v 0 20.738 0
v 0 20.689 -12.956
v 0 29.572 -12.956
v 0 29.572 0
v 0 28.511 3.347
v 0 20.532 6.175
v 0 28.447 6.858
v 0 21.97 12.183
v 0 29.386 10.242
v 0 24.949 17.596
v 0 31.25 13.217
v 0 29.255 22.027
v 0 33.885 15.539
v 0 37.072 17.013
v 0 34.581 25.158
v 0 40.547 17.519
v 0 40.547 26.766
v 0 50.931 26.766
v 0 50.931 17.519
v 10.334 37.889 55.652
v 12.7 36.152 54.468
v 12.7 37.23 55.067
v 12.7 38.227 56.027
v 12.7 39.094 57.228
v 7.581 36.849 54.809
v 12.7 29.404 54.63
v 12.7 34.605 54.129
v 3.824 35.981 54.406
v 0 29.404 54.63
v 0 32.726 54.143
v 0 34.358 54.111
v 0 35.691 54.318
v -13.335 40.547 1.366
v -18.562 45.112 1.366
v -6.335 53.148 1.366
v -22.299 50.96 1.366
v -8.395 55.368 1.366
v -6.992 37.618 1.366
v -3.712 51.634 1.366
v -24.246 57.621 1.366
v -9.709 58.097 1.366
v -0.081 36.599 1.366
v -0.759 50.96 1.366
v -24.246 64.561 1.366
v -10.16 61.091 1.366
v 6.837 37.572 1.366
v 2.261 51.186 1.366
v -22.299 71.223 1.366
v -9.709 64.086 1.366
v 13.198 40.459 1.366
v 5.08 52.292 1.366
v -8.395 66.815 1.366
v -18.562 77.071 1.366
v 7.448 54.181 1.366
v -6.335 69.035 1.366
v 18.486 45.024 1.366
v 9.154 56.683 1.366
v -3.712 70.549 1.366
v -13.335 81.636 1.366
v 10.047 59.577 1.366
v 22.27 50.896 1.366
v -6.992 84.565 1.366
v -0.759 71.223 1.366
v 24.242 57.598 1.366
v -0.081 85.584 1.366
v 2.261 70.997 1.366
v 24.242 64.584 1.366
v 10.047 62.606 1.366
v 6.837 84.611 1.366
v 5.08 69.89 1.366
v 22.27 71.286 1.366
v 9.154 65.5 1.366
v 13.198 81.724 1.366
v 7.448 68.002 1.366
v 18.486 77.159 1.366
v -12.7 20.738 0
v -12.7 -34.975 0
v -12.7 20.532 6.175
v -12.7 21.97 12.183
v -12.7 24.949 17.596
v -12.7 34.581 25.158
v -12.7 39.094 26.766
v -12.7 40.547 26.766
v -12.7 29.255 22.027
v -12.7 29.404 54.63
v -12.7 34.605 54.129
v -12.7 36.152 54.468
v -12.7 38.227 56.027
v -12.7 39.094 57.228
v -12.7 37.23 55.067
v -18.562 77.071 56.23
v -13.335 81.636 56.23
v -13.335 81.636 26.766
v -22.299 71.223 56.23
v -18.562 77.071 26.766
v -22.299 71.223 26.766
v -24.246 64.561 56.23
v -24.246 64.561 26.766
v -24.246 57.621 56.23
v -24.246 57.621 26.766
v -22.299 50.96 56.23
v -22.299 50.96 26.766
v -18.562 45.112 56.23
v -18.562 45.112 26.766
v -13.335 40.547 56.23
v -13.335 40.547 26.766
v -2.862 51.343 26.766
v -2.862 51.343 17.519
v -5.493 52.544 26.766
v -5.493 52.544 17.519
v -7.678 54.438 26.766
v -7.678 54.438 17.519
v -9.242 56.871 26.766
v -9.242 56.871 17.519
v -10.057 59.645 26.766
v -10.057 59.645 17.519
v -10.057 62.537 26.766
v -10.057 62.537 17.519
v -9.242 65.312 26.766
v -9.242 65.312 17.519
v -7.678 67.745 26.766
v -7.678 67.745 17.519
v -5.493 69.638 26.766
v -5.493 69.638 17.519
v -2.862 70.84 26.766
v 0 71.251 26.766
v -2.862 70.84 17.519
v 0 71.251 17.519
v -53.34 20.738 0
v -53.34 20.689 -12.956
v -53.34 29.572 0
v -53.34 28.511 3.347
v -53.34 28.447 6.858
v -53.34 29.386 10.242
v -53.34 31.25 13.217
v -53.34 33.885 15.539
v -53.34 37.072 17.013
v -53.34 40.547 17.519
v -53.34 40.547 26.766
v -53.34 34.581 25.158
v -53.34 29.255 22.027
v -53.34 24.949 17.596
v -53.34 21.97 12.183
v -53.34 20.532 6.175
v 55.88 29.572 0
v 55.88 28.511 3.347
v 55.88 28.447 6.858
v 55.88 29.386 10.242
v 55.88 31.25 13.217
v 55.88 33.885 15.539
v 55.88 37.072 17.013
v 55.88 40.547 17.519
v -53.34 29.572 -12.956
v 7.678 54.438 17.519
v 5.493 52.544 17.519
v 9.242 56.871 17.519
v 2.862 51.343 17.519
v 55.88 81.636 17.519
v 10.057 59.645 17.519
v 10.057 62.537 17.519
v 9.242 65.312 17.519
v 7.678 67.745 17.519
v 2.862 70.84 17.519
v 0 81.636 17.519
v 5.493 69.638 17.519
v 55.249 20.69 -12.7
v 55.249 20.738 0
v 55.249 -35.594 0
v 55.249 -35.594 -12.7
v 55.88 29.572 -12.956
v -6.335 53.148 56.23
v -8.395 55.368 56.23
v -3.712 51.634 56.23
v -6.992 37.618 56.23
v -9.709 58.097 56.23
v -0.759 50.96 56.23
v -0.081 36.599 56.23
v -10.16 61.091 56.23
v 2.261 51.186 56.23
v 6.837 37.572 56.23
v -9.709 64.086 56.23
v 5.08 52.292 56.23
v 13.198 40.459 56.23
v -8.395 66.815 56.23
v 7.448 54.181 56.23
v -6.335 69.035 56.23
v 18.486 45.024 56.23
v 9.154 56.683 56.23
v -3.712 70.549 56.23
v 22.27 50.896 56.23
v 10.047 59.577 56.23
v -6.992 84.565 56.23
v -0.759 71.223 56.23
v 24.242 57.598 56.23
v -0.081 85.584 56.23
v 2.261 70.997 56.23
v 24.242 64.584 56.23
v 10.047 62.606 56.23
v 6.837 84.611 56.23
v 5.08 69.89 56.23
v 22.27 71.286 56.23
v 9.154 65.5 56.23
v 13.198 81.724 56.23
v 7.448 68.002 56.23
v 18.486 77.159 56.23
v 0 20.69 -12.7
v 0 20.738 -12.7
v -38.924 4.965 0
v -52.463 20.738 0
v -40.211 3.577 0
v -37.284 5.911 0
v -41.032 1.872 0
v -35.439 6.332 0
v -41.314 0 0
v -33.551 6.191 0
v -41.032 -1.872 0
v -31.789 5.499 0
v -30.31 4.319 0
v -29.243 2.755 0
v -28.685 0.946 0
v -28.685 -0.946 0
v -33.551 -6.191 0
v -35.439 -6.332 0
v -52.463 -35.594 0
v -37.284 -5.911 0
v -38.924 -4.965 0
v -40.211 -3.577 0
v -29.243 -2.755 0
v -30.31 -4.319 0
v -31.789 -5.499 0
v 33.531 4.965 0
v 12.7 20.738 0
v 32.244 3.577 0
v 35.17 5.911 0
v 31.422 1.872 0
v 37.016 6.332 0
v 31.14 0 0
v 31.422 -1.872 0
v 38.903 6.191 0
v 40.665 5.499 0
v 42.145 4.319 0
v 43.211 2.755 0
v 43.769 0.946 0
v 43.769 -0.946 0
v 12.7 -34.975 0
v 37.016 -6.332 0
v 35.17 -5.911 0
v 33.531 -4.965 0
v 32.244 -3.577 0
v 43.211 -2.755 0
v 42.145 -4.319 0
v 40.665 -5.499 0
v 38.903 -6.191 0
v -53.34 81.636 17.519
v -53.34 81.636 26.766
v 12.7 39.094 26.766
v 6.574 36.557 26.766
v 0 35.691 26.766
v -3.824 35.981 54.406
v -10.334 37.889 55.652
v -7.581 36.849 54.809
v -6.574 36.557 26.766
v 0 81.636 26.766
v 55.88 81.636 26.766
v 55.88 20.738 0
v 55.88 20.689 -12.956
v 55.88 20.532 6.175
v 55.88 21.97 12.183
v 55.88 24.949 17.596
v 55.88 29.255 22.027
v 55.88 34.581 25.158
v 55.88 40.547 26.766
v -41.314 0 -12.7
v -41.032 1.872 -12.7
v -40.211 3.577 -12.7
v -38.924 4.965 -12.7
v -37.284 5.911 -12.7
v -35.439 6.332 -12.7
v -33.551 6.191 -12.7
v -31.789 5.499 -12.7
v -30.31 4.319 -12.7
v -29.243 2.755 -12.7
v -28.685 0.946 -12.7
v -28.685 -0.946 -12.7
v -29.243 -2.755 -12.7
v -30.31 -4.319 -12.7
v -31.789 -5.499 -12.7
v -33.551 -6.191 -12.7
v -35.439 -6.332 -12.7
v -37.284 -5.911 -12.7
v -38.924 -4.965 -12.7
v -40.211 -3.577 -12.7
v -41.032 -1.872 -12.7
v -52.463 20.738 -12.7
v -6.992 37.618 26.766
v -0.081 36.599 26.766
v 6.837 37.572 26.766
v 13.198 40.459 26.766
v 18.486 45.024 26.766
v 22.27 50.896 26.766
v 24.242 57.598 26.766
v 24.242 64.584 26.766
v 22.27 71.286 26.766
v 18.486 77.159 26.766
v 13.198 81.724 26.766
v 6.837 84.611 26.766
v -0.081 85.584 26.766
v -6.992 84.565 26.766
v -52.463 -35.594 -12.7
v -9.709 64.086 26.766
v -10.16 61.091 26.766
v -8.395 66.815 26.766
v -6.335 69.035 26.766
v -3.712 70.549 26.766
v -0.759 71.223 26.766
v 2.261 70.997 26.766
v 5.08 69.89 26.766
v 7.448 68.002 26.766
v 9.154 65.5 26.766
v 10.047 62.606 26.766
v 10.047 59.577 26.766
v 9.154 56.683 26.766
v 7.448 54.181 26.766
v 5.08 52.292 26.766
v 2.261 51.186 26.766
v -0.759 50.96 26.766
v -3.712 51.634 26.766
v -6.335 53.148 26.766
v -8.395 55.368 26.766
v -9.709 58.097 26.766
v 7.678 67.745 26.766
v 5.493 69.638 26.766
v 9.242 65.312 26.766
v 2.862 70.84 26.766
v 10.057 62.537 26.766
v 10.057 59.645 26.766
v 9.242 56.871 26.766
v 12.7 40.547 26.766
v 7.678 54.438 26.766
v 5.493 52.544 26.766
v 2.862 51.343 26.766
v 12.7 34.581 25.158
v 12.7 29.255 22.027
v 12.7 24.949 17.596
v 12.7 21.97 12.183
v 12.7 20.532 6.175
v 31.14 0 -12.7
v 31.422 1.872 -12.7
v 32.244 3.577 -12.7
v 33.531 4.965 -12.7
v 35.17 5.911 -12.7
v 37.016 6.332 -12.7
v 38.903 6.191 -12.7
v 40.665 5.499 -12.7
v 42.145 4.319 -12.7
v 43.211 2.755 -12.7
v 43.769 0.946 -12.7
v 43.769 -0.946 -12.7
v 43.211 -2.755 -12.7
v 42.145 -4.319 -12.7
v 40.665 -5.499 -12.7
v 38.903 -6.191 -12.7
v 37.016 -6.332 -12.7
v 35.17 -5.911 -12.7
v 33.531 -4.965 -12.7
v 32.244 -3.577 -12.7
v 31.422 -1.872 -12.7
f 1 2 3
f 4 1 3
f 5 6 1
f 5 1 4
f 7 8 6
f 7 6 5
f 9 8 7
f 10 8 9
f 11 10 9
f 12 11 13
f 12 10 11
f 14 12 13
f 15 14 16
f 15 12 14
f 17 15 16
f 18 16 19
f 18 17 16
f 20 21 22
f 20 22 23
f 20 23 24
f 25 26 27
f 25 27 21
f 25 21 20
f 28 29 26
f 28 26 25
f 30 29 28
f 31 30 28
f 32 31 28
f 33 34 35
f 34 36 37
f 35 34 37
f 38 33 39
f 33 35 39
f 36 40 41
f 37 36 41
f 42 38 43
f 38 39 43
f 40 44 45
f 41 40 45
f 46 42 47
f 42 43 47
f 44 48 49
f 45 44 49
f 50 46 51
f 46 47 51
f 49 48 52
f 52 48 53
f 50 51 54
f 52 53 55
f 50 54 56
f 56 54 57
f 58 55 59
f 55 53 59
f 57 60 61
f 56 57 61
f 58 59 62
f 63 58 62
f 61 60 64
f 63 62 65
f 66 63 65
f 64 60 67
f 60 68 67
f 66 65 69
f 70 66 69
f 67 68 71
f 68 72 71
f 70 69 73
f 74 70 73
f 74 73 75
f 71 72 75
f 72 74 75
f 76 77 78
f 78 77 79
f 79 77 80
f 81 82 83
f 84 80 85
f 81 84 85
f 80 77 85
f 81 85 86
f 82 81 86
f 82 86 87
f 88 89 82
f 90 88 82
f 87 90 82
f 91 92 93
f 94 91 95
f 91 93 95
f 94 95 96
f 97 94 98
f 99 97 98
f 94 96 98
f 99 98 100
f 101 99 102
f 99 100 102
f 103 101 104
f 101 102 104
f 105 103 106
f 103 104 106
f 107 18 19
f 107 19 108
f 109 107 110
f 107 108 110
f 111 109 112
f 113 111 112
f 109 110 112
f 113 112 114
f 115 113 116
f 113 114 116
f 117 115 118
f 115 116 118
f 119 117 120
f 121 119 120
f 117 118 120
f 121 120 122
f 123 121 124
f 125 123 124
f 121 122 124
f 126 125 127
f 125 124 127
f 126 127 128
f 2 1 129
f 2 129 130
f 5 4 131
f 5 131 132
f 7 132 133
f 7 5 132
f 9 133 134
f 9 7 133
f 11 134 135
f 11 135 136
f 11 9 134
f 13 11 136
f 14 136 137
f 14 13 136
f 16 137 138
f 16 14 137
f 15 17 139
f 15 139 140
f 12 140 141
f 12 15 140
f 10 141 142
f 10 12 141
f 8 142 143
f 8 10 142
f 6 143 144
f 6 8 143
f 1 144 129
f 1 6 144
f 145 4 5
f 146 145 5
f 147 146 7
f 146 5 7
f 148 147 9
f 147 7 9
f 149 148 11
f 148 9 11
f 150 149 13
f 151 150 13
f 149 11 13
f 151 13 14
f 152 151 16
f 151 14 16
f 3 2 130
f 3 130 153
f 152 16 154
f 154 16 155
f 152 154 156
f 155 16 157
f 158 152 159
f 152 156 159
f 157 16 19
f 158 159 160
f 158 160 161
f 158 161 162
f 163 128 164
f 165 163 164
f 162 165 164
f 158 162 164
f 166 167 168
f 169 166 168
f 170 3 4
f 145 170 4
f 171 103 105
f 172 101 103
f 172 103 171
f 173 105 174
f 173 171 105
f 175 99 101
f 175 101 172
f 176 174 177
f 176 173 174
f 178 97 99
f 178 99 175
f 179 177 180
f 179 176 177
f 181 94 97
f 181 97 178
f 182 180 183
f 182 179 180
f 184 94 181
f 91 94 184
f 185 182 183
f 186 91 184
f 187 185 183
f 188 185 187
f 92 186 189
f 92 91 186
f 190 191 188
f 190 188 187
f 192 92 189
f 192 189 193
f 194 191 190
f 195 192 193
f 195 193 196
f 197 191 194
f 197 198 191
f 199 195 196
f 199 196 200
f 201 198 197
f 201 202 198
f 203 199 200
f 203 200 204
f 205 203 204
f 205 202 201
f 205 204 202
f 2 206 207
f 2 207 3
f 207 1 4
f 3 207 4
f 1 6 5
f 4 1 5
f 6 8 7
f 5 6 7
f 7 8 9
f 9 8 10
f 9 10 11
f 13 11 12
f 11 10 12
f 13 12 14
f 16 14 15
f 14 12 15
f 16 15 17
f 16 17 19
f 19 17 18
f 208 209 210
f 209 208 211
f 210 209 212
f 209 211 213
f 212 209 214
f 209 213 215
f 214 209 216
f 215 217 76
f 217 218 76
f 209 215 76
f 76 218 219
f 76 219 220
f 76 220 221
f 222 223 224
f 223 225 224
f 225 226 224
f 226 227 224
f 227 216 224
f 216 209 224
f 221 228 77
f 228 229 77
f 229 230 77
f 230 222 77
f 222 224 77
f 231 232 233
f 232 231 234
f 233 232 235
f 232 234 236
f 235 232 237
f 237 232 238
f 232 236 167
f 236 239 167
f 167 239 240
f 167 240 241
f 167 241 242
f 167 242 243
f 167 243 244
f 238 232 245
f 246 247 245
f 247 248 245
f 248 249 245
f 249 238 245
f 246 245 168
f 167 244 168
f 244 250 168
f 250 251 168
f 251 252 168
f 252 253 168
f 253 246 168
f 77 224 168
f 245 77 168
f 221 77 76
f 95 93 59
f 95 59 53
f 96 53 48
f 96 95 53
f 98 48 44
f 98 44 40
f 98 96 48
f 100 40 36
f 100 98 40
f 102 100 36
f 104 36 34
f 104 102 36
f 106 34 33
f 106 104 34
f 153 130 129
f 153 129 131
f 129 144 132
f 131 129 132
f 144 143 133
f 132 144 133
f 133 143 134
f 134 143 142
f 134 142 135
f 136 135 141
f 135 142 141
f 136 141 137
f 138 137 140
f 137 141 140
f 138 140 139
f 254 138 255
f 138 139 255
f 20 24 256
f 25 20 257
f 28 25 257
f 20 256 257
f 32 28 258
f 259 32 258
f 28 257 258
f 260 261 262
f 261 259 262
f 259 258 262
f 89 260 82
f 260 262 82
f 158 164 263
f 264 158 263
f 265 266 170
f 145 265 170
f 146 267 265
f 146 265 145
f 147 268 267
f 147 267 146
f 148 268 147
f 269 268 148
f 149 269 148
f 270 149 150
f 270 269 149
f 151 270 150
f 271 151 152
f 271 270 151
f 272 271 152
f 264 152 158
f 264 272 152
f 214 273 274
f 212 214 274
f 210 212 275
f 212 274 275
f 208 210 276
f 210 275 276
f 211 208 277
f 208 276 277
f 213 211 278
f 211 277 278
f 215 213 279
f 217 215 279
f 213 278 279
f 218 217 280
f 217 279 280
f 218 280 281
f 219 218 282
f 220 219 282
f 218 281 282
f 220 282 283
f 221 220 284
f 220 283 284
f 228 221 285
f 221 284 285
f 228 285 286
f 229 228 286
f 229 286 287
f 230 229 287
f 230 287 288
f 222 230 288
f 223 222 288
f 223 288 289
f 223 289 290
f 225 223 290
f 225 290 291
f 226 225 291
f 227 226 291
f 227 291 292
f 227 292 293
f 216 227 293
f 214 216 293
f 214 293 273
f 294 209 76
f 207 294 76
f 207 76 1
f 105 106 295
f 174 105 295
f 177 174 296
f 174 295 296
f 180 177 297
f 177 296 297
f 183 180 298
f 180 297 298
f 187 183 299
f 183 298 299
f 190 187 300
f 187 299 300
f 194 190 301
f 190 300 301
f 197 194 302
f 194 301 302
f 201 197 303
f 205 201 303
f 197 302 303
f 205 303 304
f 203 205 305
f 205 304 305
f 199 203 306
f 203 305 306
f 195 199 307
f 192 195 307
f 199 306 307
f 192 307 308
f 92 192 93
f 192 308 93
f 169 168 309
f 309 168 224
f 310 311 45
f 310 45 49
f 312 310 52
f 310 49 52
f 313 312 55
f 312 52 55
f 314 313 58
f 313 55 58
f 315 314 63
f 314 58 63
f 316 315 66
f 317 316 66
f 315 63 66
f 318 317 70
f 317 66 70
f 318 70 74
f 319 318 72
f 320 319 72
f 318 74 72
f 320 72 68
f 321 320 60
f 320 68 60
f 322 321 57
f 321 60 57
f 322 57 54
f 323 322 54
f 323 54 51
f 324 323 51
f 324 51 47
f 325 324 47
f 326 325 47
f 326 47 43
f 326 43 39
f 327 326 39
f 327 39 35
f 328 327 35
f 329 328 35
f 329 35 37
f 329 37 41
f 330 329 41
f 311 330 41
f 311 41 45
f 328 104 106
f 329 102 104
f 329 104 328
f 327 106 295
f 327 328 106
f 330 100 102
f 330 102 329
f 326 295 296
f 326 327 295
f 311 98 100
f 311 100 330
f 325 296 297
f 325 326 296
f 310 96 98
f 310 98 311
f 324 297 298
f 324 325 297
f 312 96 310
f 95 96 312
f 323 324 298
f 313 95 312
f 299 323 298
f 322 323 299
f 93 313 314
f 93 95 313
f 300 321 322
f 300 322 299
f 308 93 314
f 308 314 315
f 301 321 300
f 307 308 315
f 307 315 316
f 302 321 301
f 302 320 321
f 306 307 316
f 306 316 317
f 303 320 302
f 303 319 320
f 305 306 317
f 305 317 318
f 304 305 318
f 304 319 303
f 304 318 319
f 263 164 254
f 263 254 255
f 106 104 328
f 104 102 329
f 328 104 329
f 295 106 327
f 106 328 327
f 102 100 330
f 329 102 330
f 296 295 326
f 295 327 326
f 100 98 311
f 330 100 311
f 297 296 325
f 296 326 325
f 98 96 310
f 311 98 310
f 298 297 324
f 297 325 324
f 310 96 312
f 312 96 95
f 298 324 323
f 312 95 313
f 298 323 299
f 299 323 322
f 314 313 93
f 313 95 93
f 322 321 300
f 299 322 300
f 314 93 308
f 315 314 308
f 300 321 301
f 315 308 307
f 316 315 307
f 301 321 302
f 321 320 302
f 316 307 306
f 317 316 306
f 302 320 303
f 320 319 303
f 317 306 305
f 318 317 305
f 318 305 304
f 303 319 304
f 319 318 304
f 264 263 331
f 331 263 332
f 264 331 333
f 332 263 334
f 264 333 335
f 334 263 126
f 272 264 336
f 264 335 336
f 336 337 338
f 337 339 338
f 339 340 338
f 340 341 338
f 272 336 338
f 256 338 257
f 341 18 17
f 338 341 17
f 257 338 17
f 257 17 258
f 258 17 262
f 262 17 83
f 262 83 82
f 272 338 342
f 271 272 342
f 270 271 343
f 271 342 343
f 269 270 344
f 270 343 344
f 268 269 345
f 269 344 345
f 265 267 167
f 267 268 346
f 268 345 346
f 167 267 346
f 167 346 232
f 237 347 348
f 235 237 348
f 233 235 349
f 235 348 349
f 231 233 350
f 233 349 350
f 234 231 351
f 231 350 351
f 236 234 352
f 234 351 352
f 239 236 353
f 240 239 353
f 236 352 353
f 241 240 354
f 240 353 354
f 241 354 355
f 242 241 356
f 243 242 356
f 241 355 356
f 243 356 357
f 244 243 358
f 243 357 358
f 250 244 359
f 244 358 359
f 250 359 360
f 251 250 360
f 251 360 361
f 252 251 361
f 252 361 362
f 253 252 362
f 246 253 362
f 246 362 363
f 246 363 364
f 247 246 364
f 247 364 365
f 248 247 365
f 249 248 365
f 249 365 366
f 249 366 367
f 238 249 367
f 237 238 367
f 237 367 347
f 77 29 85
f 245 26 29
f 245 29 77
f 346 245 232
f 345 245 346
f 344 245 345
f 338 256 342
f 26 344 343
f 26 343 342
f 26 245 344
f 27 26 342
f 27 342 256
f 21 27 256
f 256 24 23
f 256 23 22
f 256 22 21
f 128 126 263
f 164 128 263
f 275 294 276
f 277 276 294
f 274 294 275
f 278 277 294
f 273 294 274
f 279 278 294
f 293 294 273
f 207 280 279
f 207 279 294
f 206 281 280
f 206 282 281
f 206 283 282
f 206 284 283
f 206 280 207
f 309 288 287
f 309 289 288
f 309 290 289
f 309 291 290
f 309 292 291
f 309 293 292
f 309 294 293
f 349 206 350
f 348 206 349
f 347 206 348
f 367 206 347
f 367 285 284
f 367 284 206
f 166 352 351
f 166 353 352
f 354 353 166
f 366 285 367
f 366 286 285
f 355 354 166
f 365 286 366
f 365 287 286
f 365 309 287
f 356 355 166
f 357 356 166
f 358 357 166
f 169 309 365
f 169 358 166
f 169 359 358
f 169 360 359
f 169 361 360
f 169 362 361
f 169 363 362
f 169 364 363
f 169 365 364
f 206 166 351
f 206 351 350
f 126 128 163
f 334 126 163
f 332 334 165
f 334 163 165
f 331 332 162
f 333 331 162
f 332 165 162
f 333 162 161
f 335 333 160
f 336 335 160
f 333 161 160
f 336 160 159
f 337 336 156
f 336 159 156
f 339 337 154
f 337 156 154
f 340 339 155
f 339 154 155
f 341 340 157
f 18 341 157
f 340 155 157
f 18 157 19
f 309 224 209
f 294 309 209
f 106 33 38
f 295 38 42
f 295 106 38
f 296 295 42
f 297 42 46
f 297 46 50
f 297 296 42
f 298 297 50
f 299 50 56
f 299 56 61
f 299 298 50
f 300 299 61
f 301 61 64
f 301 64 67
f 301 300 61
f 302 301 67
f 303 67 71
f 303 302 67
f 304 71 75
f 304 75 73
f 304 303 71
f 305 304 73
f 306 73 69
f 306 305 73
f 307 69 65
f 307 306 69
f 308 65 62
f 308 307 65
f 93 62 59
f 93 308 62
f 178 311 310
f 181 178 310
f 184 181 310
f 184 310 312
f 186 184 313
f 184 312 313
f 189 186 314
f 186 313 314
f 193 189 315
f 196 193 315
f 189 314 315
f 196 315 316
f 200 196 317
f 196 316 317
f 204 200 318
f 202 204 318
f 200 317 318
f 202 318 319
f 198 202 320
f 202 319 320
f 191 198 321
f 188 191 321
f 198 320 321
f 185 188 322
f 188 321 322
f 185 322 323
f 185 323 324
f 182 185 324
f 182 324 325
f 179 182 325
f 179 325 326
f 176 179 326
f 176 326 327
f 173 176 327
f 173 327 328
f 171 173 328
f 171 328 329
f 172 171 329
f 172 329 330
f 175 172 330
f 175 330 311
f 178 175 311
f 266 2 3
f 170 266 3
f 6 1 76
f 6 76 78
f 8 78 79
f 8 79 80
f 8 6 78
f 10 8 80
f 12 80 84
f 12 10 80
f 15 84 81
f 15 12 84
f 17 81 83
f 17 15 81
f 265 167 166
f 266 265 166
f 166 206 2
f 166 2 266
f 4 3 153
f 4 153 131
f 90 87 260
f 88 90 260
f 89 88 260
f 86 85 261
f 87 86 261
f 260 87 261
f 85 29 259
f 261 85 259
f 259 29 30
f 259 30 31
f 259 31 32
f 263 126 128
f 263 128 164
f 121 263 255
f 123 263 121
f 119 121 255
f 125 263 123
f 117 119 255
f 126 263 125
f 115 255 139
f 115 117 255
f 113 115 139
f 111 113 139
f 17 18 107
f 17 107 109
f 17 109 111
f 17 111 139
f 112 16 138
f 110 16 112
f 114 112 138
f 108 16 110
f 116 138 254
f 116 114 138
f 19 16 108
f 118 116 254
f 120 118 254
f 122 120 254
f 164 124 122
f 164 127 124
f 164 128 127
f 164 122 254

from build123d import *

# Parameters (mm, degrees)
F1_DEPTH  = 12.7
F2_DEPTH  = 12.7
F3_W      = 25.4
F3_H      = 55.7129587978
F4_DEPTH  = 12.7
F6_D      = 12.7
F7_DEPTH  = 55.88
F8_DEPTH  = 53.34
F10_D     = 50.8
F10_DEPTH = 33.1269099427
F12_DEPTH = 29.464
F13_DEPTH = 25.4
F15_D     = 20.32
F15_2_D   = 20.32
F15_3_D   = 20.32
F15_4_D   = 20.32


with BuildPart() as f1:
    # F0 (on Right) → F1 (new body)
    with BuildSketch(Plane.YZ):
        with BuildLine():
            Line((-34.9753573537, 0), (20.7376014441, 0))
            ThreePointArc((20.7376014441, 0), (24.9488611287, 17.5963253467), (40.5466556549, 26.765522681))
            Line((40.5466556549, 26.765522681), (40.5466556549, 44.106092304))
            Line((40.5466556549, 44.106092304), (40.5466556549, 59.8914325237))
            add(Edge.make_bspline(
                [(29.4040590525, 54.629649967), (32.0270746005, 54.16689326), (37.1802803584, 53.2577562445), (39.4380872753, 57.7069215539), (40.5466556549, 59.8914325237)],
                knots=[0, 0, 0, 0, 0.5090065624, 1, 1, 1, 1], degree=3))
            Line((29.4040590525, 54.629649967), (-34.9753573537, 0))
        make_face()
    extrude(amount=F1_DEPTH)

    # F2 (add): a face of the model
    f2_faces = [f1.faces().sort_by_distance(p)[0] for p in [
        (0, 11.2568434732, 22.7028635071),
    ]]
    extrude(f2_faces, amount=F2_DEPTH)

    # F3 (on face) → F4 (join)
    with BuildSketch(Plane(origin=(0, 0, 0), x_dir=(1, 0, 0), z_dir=(0, 0, -1))):
        Polygon((-52.4630360305, 35.5943925679), (-52.4630360305, -20.7376014441), (-12.7, -20.7376014441), (-12.7, 34.9753573537), (12.7, 34.9753573537), (12.7, -20.7376014441), (55.2486851811, -20.7376014441), (55.2486851811, 35.5943925679), align=None)
        with Locations((0, 7.1188779548)):
            Rectangle(F3_W, F3_H)
    extrude(amount=F4_DEPTH)

    # F6 (through all)
    with Locations(Plane.XY):
        with Locations((-34.9643975496, 0), (37.4901294708, 0)):
            Hole(F6_D / 2)

    # F0 (on Right) → F7 (join)
    with BuildSketch(Plane.YZ):
        with BuildLine():
            ThreePointArc((40.5466556549, 26.765522681), (24.9488611287, 17.5963253467), (20.7376014441, 0))
            Line((20.7376014441, 0), (20.6894278526, -12.9558527842))
            Line((20.6894278526, -12.9558527842), (29.5723360032, -12.9558527842))
            Line((29.5723360032, -12.9558527842), (29.5723360032, 0))
            ThreePointArc((29.5723360032, 0), (30.2105216332, 11.7969349668), (40.5466556549, 17.5187606364))
            Line((40.5466556549, 17.5187606364), (81.6358923912, 17.5187606364))
            Line((81.6358923912, 17.5187606364), (81.6358923912, 26.765522681))
            Line((81.6358923912, 26.765522681), (40.5466556549, 26.765522681))
        make_face()
    extrude(amount=F7_DEPTH)

    # F10 (through all, one way)
    with BuildSketch(Plane(origin=(0, 0, 26.765522681), x_dir=(1, 0, 0), z_dir=(0, 0, -1))):
        with Locations((0, -61.0912740231)):
            Circle(F10_D / 2)
    extrude(amount=-F10_DEPTH, mode=Mode.SUBTRACT)

    # F15 (through all)
    with Locations(Plane.XY.offset(56.229522681)):
        with Locations((0, 61.0912740231)):
            Hole(F15_D / 2)


with BuildPart() as f8:
    # F0 (on Right) → F8 (new body)
    with BuildSketch(Plane.YZ):
        with BuildLine():
            ThreePointArc((40.5466556549, 26.765522681), (24.9488611287, 17.5963253467), (20.7376014441, 0))
            Line((20.7376014441, 0), (20.6894278526, -12.9558527842))
            Line((20.6894278526, -12.9558527842), (29.5723360032, -12.9558527842))
            Line((29.5723360032, -12.9558527842), (29.5723360032, 0))
            ThreePointArc((29.5723360032, 0), (30.2105216332, 11.7969349668), (40.5466556549, 17.5187606364))
            Line((40.5466556549, 17.5187606364), (81.6358923912, 17.5187606364))
            Line((81.6358923912, 17.5187606364), (81.6358923912, 26.765522681))
            Line((81.6358923912, 26.765522681), (40.5466556549, 26.765522681))
        make_face()
    extrude(amount=-F8_DEPTH)

    # F15#2 (through all)
    with Locations(Plane.XY.offset(56.229522681)):
        with Locations((0, 61.0912740231)):
            Hole(F15_2_D / 2)


with BuildPart() as f12:
    # F11 (on face) → F12 (new body)
    with BuildSketch(Plane.XY.offset(26.765522681)):
        with BuildLine():
            Line((0, 81.6358923912), (-13.3348583138, 81.6358923912))
            ThreePointArc((-13.3348583138, 81.6358923912), (-24.4928518173, 61.0912740231), (-13.3348583138, 40.5466556549))
            Line((-13.3348583138, 40.5466556549), (0, 40.5466556549))
            Line((0, 40.5466556549), (0, 81.6358923912))
        make_face()
        with BuildLine():
            ThreePointArc((-13.3348583138, 40.5466556549), (11.6895483544, 39.5679320564), (24.4928518173, 61.0912740231))
            ThreePointArc((24.4928518173, 61.0912740231), (11.6895483544, 82.6146159897), (-13.3348583138, 81.6358923912))
            Line((-13.3348583138, 81.6358923912), (0, 81.6358923912))
            Line((0, 81.6358923912), (0, 40.5466556549))
            Line((0, 40.5466556549), (-13.3348583138, 40.5466556549))
        make_face()
    extrude(amount=F12_DEPTH)


with BuildPart() as f13:
    # F13 (new): a face of the model
    f13_faces = [f12.part.faces().sort_by_distance(p)[0] for p in [
        (0, 61.0912740231, 26.765522681),
    ]]
    extrude(f13_faces, amount=F13_DEPTH)

    # F15#4 (through all)
    with Locations(Plane.XY.offset(56.229522681)):
        with Locations((0, 61.0912740231)):
            Hole(F15_4_D / 2)


with BuildPart() as f12_1:
    add(f12.part)

    # F15#3 (through all)
    with Locations(Plane.XY.offset(56.229522681)):
        with Locations((0, 61.0912740231)):
            Hole(F15_3_D / 2)


solid = Compound([f1.part, f8.part, f13.part, f12_1.part])
